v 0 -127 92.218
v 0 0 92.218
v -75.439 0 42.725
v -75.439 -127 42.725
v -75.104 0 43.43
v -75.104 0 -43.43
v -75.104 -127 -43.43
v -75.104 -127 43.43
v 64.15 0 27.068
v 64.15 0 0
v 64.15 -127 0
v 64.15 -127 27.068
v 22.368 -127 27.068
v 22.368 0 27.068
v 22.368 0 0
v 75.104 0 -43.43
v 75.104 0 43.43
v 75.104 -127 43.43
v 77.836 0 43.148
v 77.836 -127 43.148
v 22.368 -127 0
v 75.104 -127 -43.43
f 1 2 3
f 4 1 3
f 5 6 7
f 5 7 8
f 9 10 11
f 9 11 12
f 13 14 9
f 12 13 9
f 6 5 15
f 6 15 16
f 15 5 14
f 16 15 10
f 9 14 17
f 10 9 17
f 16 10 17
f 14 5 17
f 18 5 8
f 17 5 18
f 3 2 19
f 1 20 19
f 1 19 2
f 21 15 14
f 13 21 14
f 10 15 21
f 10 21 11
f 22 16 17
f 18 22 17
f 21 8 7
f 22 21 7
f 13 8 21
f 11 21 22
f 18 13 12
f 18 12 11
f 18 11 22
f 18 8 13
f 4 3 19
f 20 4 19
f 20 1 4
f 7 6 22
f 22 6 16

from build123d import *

# Parameters (mm, degrees)
F4_DEPTH = 127
F2_W     = 150.2084136009
F2_H     = 86.8601500988
F2_W_2   = 41.7817831039
F2_H_2   = 27.0675420761


with BuildPart() as f4:
    # F1 (on Front) → F4 (new body)
    with BuildSketch(Plane.XZ):
        Polygon((0, 92.2183766961), (-75.4385888577, 42.7250191569), (77.8357088566, 43.1480407715), align=None)
    extrude(amount=F4_DEPTH)


with BuildPart() as f4b:
    # F2 (on face) → F4, piece 2 (new body)
    with BuildSketch(Plane.XZ):
        Rectangle(F2_W, F2_H)
        with Locations((43.2593524456, 13.5337710381)):
            Rectangle(F2_W_2, F2_H_2, mode=Mode.SUBTRACT)
    extrude(amount=F4_DEPTH)


solid = Compound([f4.part, f4b.part])
